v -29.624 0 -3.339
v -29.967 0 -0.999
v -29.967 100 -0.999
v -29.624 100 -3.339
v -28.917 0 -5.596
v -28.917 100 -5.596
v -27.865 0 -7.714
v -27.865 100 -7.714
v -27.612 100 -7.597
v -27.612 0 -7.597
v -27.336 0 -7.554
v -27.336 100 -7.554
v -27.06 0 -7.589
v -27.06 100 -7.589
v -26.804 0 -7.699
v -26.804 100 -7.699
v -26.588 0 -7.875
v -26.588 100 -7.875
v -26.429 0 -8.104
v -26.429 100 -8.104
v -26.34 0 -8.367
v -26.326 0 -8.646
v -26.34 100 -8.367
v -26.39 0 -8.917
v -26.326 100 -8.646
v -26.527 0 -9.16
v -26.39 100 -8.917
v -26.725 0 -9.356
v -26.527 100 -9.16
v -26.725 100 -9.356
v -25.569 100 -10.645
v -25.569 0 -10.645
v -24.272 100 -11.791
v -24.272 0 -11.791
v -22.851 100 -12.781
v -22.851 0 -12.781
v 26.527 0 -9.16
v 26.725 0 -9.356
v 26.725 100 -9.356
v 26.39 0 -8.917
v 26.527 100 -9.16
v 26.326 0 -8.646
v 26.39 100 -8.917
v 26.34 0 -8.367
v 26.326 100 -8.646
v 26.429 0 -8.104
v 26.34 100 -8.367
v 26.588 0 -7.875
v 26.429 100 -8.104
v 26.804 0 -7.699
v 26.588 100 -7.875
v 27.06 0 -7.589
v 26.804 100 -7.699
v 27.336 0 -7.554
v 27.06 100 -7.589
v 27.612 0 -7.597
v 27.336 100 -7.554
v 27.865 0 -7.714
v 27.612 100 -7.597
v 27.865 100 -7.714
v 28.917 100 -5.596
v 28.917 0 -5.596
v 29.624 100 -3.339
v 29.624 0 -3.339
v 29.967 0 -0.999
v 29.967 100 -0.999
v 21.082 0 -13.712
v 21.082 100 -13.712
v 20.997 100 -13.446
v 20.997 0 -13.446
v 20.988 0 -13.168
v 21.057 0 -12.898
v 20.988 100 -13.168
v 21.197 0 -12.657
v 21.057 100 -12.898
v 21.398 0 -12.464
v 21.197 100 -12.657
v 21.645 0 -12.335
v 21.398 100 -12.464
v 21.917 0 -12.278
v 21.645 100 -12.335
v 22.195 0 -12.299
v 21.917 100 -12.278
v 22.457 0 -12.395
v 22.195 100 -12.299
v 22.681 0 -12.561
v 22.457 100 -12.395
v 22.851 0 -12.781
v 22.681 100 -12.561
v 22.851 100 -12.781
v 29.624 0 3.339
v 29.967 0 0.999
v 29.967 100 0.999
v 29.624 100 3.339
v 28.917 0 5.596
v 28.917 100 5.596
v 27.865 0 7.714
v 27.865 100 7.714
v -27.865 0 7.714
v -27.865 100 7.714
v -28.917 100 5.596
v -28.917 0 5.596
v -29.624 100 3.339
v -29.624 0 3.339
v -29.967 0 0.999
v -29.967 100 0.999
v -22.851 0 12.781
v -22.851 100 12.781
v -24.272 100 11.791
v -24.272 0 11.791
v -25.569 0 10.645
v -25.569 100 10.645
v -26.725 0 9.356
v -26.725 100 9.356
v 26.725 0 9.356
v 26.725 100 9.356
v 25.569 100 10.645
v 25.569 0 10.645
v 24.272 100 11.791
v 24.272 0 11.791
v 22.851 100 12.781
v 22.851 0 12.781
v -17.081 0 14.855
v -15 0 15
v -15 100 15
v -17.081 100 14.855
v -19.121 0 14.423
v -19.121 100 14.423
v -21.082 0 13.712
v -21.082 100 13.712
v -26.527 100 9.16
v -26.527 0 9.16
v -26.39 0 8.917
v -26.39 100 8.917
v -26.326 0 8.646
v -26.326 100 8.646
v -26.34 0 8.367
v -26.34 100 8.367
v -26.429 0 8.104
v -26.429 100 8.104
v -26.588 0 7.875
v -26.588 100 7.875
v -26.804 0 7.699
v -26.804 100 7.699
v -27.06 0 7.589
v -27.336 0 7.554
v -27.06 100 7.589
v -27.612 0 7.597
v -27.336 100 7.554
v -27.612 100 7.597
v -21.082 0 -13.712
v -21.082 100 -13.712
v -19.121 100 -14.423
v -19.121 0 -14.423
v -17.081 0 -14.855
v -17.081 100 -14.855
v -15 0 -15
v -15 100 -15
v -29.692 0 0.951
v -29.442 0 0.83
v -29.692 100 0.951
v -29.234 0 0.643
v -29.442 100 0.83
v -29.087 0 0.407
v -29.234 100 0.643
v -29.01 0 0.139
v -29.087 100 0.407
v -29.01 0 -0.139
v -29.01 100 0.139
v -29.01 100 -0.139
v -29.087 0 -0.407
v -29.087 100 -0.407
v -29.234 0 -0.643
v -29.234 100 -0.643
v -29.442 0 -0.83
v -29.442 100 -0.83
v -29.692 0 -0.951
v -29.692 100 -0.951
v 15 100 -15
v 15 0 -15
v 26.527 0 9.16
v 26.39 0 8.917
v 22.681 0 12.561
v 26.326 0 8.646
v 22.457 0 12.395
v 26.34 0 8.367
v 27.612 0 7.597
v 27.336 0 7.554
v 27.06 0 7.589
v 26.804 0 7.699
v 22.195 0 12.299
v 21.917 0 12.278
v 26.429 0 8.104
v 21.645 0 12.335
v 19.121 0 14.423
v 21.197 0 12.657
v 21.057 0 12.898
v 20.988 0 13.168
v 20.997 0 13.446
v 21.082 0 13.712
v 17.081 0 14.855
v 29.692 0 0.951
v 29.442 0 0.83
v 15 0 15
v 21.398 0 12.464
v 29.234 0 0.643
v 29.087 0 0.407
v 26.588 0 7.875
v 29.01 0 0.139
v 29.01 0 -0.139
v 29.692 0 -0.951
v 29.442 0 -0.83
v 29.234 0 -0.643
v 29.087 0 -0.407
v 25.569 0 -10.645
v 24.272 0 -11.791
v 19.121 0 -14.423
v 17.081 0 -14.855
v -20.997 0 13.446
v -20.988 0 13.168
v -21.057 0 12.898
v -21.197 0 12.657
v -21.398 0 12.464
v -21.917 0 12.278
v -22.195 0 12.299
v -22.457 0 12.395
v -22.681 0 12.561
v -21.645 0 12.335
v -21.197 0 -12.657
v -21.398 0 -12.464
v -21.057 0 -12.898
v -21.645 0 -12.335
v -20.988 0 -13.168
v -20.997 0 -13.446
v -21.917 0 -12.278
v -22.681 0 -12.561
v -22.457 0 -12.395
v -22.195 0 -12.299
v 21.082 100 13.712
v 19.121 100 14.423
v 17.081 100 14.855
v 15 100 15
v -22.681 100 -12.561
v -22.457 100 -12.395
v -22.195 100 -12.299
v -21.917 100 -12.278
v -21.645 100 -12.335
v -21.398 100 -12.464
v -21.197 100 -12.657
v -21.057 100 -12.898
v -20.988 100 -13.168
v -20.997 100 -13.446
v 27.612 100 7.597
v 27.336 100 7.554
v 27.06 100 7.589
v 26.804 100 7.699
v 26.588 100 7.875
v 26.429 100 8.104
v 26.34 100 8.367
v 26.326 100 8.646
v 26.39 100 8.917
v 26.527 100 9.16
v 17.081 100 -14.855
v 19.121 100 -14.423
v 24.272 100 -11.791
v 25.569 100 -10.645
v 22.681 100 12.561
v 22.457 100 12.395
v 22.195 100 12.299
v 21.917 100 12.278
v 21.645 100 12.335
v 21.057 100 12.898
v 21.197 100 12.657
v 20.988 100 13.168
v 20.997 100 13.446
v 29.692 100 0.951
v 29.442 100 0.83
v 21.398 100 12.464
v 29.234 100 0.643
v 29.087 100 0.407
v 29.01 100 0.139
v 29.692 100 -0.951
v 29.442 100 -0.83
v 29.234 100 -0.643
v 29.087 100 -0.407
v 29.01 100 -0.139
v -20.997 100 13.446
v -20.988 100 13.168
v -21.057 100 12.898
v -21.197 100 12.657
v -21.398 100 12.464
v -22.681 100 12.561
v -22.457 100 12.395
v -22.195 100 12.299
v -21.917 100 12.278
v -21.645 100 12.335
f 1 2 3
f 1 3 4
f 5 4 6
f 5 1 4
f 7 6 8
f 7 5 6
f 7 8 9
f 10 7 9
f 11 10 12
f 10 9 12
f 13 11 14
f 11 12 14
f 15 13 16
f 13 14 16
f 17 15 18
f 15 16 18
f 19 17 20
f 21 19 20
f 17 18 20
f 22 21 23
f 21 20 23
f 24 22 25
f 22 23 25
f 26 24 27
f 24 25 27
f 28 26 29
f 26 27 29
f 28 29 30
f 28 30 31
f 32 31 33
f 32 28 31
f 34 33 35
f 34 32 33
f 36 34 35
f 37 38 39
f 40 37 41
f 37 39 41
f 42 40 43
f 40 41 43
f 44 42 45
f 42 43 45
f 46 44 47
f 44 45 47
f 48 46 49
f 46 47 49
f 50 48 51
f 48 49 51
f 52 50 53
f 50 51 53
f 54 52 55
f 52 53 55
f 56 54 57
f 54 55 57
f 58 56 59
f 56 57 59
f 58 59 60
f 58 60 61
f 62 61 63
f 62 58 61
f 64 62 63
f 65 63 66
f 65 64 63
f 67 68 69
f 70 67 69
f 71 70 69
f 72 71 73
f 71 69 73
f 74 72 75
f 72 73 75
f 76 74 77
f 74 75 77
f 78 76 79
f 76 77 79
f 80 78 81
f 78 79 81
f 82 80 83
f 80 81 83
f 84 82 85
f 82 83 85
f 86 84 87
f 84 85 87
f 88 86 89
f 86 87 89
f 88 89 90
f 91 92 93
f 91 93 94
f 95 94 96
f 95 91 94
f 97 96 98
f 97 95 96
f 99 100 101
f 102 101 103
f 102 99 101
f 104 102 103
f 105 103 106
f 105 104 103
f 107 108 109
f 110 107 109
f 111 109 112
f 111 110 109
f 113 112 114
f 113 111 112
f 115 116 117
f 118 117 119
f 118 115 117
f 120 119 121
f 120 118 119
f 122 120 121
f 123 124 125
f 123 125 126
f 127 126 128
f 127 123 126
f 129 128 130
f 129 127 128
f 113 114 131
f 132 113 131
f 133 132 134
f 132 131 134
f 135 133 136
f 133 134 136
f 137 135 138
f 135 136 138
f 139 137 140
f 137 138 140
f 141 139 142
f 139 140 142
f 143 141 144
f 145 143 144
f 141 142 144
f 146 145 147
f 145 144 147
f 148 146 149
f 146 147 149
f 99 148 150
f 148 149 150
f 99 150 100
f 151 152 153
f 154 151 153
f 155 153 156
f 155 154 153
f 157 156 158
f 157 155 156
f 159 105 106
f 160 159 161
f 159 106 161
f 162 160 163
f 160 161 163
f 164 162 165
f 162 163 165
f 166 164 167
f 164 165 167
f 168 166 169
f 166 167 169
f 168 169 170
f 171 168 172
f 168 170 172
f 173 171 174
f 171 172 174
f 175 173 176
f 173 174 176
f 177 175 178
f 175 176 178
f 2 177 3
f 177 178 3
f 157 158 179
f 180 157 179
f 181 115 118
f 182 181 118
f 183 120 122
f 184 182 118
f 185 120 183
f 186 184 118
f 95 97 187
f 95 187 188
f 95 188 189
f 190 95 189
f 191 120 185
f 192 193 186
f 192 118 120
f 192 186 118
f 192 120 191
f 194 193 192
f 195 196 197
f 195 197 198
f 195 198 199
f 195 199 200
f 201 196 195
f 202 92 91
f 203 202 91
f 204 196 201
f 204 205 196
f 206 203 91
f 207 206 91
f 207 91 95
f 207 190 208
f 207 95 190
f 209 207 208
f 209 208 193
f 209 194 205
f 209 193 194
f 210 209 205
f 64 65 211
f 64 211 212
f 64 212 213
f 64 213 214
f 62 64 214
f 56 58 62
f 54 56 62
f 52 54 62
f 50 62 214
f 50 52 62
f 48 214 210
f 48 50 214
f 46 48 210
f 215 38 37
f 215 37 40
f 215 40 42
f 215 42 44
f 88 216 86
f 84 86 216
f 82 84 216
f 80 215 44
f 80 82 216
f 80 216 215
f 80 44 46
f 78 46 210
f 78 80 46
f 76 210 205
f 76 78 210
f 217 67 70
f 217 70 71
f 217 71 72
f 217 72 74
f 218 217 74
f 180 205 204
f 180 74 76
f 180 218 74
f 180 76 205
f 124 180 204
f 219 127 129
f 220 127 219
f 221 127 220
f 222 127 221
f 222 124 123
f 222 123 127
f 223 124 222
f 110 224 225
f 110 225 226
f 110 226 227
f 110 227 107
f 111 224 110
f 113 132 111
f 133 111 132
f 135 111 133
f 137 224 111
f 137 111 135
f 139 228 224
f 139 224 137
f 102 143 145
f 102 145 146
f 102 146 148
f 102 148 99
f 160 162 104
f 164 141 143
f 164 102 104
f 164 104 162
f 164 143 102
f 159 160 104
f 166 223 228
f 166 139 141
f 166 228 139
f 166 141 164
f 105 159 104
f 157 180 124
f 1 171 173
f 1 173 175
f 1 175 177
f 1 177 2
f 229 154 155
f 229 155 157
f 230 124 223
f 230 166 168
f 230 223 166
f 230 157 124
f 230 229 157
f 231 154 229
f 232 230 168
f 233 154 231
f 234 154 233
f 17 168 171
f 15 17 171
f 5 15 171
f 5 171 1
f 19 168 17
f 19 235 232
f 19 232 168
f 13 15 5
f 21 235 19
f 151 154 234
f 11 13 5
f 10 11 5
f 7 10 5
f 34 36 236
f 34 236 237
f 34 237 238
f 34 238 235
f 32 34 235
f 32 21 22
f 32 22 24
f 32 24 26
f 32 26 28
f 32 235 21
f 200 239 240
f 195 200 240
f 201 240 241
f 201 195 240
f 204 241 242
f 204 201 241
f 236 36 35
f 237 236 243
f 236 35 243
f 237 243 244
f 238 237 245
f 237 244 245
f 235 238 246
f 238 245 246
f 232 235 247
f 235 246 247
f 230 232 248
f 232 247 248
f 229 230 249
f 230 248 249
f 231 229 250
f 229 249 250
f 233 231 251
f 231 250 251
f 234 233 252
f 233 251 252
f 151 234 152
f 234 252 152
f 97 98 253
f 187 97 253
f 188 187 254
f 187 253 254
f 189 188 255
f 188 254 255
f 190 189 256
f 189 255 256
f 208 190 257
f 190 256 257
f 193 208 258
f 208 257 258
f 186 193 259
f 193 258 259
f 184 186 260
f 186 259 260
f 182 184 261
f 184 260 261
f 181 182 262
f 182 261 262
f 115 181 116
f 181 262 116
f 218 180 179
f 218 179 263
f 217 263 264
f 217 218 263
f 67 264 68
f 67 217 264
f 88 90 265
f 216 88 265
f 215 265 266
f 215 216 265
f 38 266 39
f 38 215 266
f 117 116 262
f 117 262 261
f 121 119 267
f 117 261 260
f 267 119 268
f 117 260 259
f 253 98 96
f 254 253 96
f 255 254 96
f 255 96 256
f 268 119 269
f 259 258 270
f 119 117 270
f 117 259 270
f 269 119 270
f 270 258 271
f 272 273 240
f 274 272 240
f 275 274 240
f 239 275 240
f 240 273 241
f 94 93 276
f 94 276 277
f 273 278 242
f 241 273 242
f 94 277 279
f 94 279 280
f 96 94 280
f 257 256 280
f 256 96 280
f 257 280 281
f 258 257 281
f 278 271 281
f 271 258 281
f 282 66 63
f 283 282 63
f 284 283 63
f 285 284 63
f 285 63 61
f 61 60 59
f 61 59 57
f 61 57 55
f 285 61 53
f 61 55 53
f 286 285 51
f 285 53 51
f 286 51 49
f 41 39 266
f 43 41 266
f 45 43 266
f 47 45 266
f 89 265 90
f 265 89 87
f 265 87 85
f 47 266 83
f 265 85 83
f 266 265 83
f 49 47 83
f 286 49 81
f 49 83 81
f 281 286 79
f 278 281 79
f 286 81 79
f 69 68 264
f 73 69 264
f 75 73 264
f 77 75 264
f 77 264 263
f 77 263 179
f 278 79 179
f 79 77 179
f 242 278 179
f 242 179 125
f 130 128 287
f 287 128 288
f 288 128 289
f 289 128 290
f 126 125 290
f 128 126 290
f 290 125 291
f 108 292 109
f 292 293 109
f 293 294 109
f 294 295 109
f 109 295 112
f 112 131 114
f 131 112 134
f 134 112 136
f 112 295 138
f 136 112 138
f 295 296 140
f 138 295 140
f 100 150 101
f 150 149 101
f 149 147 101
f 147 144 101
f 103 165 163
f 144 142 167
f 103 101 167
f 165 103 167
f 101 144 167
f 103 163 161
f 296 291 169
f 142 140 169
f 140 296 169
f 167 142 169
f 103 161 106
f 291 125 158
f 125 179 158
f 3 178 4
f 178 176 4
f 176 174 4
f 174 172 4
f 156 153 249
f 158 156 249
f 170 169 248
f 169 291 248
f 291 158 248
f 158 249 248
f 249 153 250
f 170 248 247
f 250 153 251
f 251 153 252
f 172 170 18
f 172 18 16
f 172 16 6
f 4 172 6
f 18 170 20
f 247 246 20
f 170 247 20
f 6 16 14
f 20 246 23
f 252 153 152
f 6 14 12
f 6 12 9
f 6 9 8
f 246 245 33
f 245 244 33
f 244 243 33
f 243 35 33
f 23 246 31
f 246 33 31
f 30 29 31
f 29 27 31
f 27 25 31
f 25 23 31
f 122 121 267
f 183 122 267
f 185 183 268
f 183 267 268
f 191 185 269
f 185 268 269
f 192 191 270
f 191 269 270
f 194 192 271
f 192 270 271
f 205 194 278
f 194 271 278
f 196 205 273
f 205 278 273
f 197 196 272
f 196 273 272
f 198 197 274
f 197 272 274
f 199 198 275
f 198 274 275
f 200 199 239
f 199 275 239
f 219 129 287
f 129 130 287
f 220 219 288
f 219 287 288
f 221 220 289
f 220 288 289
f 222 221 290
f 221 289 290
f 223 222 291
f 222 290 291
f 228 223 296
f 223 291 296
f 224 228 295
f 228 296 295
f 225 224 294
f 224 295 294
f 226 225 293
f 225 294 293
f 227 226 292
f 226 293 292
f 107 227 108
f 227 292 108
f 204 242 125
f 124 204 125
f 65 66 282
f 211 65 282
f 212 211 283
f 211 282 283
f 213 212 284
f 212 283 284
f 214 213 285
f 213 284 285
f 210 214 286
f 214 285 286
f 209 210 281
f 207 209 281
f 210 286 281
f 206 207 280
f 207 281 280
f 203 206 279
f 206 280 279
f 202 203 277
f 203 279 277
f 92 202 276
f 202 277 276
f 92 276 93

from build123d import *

# Parameters (mm, degrees)
BOSS_EXTRUDE1_DEPTH = 100
SKETCH2_R           = 1
CUT_EXTRUDE1_DEPTH  = 106.475115549


with BuildPart() as part:
    # Sketch1 → Boss-Extrude1 (new body)
    with BuildSketch(Plane(origin=(0, 0, 0), x_dir=(1, 0, 0), z_dir=(0, 1, 0))):
        with BuildLine():
            Line((15, -15), (-15, -15))
            ThreePointArc((-15, -15), (-30, 0), (-15, 15))
            Line((-15, 15), (15, 15))
            ThreePointArc((15, 15), (30, 0), (15, -15))
        make_face()
    extrude(amount=BOSS_EXTRUDE1_DEPTH)

    # Sketch2 → Cut-Extrude1 (cut, through all)
    with BuildSketch(Plane(origin=(0, 100, 0), x_dir=(1, 0, 0), z_dir=(0, 1, 0))):
        with Locations((-21.982299004, 13.275823915)):
            Circle(SKETCH2_R)
        with Locations((-30, 0)):
            Circle(SKETCH2_R)
        with Locations((-21.982299004, -13.275823915)):
            Circle(SKETCH2_R)
        with Locations((-27.321975393, 8.55388347)):
            Circle(SKETCH2_R)
        with Locations((-27.321975393, -8.55388347)):
            Circle(SKETCH2_R)
        with Locations((21.982299004, -13.275823915)):
            Circle(SKETCH2_R)
        with Locations((27.321975393, -8.55388347)):
            Circle(SKETCH2_R)
        with Locations((30, 0)):
            Circle(SKETCH2_R)
        with Locations((27.321975393, 8.55388347)):
            Circle(SKETCH2_R)
        with Locations((21.982299004, 13.275823915)):
            Circle(SKETCH2_R)
    extrude(amount=-CUT_EXTRUDE1_DEPTH, mode=Mode.SUBTRACT)


solid = part.part
